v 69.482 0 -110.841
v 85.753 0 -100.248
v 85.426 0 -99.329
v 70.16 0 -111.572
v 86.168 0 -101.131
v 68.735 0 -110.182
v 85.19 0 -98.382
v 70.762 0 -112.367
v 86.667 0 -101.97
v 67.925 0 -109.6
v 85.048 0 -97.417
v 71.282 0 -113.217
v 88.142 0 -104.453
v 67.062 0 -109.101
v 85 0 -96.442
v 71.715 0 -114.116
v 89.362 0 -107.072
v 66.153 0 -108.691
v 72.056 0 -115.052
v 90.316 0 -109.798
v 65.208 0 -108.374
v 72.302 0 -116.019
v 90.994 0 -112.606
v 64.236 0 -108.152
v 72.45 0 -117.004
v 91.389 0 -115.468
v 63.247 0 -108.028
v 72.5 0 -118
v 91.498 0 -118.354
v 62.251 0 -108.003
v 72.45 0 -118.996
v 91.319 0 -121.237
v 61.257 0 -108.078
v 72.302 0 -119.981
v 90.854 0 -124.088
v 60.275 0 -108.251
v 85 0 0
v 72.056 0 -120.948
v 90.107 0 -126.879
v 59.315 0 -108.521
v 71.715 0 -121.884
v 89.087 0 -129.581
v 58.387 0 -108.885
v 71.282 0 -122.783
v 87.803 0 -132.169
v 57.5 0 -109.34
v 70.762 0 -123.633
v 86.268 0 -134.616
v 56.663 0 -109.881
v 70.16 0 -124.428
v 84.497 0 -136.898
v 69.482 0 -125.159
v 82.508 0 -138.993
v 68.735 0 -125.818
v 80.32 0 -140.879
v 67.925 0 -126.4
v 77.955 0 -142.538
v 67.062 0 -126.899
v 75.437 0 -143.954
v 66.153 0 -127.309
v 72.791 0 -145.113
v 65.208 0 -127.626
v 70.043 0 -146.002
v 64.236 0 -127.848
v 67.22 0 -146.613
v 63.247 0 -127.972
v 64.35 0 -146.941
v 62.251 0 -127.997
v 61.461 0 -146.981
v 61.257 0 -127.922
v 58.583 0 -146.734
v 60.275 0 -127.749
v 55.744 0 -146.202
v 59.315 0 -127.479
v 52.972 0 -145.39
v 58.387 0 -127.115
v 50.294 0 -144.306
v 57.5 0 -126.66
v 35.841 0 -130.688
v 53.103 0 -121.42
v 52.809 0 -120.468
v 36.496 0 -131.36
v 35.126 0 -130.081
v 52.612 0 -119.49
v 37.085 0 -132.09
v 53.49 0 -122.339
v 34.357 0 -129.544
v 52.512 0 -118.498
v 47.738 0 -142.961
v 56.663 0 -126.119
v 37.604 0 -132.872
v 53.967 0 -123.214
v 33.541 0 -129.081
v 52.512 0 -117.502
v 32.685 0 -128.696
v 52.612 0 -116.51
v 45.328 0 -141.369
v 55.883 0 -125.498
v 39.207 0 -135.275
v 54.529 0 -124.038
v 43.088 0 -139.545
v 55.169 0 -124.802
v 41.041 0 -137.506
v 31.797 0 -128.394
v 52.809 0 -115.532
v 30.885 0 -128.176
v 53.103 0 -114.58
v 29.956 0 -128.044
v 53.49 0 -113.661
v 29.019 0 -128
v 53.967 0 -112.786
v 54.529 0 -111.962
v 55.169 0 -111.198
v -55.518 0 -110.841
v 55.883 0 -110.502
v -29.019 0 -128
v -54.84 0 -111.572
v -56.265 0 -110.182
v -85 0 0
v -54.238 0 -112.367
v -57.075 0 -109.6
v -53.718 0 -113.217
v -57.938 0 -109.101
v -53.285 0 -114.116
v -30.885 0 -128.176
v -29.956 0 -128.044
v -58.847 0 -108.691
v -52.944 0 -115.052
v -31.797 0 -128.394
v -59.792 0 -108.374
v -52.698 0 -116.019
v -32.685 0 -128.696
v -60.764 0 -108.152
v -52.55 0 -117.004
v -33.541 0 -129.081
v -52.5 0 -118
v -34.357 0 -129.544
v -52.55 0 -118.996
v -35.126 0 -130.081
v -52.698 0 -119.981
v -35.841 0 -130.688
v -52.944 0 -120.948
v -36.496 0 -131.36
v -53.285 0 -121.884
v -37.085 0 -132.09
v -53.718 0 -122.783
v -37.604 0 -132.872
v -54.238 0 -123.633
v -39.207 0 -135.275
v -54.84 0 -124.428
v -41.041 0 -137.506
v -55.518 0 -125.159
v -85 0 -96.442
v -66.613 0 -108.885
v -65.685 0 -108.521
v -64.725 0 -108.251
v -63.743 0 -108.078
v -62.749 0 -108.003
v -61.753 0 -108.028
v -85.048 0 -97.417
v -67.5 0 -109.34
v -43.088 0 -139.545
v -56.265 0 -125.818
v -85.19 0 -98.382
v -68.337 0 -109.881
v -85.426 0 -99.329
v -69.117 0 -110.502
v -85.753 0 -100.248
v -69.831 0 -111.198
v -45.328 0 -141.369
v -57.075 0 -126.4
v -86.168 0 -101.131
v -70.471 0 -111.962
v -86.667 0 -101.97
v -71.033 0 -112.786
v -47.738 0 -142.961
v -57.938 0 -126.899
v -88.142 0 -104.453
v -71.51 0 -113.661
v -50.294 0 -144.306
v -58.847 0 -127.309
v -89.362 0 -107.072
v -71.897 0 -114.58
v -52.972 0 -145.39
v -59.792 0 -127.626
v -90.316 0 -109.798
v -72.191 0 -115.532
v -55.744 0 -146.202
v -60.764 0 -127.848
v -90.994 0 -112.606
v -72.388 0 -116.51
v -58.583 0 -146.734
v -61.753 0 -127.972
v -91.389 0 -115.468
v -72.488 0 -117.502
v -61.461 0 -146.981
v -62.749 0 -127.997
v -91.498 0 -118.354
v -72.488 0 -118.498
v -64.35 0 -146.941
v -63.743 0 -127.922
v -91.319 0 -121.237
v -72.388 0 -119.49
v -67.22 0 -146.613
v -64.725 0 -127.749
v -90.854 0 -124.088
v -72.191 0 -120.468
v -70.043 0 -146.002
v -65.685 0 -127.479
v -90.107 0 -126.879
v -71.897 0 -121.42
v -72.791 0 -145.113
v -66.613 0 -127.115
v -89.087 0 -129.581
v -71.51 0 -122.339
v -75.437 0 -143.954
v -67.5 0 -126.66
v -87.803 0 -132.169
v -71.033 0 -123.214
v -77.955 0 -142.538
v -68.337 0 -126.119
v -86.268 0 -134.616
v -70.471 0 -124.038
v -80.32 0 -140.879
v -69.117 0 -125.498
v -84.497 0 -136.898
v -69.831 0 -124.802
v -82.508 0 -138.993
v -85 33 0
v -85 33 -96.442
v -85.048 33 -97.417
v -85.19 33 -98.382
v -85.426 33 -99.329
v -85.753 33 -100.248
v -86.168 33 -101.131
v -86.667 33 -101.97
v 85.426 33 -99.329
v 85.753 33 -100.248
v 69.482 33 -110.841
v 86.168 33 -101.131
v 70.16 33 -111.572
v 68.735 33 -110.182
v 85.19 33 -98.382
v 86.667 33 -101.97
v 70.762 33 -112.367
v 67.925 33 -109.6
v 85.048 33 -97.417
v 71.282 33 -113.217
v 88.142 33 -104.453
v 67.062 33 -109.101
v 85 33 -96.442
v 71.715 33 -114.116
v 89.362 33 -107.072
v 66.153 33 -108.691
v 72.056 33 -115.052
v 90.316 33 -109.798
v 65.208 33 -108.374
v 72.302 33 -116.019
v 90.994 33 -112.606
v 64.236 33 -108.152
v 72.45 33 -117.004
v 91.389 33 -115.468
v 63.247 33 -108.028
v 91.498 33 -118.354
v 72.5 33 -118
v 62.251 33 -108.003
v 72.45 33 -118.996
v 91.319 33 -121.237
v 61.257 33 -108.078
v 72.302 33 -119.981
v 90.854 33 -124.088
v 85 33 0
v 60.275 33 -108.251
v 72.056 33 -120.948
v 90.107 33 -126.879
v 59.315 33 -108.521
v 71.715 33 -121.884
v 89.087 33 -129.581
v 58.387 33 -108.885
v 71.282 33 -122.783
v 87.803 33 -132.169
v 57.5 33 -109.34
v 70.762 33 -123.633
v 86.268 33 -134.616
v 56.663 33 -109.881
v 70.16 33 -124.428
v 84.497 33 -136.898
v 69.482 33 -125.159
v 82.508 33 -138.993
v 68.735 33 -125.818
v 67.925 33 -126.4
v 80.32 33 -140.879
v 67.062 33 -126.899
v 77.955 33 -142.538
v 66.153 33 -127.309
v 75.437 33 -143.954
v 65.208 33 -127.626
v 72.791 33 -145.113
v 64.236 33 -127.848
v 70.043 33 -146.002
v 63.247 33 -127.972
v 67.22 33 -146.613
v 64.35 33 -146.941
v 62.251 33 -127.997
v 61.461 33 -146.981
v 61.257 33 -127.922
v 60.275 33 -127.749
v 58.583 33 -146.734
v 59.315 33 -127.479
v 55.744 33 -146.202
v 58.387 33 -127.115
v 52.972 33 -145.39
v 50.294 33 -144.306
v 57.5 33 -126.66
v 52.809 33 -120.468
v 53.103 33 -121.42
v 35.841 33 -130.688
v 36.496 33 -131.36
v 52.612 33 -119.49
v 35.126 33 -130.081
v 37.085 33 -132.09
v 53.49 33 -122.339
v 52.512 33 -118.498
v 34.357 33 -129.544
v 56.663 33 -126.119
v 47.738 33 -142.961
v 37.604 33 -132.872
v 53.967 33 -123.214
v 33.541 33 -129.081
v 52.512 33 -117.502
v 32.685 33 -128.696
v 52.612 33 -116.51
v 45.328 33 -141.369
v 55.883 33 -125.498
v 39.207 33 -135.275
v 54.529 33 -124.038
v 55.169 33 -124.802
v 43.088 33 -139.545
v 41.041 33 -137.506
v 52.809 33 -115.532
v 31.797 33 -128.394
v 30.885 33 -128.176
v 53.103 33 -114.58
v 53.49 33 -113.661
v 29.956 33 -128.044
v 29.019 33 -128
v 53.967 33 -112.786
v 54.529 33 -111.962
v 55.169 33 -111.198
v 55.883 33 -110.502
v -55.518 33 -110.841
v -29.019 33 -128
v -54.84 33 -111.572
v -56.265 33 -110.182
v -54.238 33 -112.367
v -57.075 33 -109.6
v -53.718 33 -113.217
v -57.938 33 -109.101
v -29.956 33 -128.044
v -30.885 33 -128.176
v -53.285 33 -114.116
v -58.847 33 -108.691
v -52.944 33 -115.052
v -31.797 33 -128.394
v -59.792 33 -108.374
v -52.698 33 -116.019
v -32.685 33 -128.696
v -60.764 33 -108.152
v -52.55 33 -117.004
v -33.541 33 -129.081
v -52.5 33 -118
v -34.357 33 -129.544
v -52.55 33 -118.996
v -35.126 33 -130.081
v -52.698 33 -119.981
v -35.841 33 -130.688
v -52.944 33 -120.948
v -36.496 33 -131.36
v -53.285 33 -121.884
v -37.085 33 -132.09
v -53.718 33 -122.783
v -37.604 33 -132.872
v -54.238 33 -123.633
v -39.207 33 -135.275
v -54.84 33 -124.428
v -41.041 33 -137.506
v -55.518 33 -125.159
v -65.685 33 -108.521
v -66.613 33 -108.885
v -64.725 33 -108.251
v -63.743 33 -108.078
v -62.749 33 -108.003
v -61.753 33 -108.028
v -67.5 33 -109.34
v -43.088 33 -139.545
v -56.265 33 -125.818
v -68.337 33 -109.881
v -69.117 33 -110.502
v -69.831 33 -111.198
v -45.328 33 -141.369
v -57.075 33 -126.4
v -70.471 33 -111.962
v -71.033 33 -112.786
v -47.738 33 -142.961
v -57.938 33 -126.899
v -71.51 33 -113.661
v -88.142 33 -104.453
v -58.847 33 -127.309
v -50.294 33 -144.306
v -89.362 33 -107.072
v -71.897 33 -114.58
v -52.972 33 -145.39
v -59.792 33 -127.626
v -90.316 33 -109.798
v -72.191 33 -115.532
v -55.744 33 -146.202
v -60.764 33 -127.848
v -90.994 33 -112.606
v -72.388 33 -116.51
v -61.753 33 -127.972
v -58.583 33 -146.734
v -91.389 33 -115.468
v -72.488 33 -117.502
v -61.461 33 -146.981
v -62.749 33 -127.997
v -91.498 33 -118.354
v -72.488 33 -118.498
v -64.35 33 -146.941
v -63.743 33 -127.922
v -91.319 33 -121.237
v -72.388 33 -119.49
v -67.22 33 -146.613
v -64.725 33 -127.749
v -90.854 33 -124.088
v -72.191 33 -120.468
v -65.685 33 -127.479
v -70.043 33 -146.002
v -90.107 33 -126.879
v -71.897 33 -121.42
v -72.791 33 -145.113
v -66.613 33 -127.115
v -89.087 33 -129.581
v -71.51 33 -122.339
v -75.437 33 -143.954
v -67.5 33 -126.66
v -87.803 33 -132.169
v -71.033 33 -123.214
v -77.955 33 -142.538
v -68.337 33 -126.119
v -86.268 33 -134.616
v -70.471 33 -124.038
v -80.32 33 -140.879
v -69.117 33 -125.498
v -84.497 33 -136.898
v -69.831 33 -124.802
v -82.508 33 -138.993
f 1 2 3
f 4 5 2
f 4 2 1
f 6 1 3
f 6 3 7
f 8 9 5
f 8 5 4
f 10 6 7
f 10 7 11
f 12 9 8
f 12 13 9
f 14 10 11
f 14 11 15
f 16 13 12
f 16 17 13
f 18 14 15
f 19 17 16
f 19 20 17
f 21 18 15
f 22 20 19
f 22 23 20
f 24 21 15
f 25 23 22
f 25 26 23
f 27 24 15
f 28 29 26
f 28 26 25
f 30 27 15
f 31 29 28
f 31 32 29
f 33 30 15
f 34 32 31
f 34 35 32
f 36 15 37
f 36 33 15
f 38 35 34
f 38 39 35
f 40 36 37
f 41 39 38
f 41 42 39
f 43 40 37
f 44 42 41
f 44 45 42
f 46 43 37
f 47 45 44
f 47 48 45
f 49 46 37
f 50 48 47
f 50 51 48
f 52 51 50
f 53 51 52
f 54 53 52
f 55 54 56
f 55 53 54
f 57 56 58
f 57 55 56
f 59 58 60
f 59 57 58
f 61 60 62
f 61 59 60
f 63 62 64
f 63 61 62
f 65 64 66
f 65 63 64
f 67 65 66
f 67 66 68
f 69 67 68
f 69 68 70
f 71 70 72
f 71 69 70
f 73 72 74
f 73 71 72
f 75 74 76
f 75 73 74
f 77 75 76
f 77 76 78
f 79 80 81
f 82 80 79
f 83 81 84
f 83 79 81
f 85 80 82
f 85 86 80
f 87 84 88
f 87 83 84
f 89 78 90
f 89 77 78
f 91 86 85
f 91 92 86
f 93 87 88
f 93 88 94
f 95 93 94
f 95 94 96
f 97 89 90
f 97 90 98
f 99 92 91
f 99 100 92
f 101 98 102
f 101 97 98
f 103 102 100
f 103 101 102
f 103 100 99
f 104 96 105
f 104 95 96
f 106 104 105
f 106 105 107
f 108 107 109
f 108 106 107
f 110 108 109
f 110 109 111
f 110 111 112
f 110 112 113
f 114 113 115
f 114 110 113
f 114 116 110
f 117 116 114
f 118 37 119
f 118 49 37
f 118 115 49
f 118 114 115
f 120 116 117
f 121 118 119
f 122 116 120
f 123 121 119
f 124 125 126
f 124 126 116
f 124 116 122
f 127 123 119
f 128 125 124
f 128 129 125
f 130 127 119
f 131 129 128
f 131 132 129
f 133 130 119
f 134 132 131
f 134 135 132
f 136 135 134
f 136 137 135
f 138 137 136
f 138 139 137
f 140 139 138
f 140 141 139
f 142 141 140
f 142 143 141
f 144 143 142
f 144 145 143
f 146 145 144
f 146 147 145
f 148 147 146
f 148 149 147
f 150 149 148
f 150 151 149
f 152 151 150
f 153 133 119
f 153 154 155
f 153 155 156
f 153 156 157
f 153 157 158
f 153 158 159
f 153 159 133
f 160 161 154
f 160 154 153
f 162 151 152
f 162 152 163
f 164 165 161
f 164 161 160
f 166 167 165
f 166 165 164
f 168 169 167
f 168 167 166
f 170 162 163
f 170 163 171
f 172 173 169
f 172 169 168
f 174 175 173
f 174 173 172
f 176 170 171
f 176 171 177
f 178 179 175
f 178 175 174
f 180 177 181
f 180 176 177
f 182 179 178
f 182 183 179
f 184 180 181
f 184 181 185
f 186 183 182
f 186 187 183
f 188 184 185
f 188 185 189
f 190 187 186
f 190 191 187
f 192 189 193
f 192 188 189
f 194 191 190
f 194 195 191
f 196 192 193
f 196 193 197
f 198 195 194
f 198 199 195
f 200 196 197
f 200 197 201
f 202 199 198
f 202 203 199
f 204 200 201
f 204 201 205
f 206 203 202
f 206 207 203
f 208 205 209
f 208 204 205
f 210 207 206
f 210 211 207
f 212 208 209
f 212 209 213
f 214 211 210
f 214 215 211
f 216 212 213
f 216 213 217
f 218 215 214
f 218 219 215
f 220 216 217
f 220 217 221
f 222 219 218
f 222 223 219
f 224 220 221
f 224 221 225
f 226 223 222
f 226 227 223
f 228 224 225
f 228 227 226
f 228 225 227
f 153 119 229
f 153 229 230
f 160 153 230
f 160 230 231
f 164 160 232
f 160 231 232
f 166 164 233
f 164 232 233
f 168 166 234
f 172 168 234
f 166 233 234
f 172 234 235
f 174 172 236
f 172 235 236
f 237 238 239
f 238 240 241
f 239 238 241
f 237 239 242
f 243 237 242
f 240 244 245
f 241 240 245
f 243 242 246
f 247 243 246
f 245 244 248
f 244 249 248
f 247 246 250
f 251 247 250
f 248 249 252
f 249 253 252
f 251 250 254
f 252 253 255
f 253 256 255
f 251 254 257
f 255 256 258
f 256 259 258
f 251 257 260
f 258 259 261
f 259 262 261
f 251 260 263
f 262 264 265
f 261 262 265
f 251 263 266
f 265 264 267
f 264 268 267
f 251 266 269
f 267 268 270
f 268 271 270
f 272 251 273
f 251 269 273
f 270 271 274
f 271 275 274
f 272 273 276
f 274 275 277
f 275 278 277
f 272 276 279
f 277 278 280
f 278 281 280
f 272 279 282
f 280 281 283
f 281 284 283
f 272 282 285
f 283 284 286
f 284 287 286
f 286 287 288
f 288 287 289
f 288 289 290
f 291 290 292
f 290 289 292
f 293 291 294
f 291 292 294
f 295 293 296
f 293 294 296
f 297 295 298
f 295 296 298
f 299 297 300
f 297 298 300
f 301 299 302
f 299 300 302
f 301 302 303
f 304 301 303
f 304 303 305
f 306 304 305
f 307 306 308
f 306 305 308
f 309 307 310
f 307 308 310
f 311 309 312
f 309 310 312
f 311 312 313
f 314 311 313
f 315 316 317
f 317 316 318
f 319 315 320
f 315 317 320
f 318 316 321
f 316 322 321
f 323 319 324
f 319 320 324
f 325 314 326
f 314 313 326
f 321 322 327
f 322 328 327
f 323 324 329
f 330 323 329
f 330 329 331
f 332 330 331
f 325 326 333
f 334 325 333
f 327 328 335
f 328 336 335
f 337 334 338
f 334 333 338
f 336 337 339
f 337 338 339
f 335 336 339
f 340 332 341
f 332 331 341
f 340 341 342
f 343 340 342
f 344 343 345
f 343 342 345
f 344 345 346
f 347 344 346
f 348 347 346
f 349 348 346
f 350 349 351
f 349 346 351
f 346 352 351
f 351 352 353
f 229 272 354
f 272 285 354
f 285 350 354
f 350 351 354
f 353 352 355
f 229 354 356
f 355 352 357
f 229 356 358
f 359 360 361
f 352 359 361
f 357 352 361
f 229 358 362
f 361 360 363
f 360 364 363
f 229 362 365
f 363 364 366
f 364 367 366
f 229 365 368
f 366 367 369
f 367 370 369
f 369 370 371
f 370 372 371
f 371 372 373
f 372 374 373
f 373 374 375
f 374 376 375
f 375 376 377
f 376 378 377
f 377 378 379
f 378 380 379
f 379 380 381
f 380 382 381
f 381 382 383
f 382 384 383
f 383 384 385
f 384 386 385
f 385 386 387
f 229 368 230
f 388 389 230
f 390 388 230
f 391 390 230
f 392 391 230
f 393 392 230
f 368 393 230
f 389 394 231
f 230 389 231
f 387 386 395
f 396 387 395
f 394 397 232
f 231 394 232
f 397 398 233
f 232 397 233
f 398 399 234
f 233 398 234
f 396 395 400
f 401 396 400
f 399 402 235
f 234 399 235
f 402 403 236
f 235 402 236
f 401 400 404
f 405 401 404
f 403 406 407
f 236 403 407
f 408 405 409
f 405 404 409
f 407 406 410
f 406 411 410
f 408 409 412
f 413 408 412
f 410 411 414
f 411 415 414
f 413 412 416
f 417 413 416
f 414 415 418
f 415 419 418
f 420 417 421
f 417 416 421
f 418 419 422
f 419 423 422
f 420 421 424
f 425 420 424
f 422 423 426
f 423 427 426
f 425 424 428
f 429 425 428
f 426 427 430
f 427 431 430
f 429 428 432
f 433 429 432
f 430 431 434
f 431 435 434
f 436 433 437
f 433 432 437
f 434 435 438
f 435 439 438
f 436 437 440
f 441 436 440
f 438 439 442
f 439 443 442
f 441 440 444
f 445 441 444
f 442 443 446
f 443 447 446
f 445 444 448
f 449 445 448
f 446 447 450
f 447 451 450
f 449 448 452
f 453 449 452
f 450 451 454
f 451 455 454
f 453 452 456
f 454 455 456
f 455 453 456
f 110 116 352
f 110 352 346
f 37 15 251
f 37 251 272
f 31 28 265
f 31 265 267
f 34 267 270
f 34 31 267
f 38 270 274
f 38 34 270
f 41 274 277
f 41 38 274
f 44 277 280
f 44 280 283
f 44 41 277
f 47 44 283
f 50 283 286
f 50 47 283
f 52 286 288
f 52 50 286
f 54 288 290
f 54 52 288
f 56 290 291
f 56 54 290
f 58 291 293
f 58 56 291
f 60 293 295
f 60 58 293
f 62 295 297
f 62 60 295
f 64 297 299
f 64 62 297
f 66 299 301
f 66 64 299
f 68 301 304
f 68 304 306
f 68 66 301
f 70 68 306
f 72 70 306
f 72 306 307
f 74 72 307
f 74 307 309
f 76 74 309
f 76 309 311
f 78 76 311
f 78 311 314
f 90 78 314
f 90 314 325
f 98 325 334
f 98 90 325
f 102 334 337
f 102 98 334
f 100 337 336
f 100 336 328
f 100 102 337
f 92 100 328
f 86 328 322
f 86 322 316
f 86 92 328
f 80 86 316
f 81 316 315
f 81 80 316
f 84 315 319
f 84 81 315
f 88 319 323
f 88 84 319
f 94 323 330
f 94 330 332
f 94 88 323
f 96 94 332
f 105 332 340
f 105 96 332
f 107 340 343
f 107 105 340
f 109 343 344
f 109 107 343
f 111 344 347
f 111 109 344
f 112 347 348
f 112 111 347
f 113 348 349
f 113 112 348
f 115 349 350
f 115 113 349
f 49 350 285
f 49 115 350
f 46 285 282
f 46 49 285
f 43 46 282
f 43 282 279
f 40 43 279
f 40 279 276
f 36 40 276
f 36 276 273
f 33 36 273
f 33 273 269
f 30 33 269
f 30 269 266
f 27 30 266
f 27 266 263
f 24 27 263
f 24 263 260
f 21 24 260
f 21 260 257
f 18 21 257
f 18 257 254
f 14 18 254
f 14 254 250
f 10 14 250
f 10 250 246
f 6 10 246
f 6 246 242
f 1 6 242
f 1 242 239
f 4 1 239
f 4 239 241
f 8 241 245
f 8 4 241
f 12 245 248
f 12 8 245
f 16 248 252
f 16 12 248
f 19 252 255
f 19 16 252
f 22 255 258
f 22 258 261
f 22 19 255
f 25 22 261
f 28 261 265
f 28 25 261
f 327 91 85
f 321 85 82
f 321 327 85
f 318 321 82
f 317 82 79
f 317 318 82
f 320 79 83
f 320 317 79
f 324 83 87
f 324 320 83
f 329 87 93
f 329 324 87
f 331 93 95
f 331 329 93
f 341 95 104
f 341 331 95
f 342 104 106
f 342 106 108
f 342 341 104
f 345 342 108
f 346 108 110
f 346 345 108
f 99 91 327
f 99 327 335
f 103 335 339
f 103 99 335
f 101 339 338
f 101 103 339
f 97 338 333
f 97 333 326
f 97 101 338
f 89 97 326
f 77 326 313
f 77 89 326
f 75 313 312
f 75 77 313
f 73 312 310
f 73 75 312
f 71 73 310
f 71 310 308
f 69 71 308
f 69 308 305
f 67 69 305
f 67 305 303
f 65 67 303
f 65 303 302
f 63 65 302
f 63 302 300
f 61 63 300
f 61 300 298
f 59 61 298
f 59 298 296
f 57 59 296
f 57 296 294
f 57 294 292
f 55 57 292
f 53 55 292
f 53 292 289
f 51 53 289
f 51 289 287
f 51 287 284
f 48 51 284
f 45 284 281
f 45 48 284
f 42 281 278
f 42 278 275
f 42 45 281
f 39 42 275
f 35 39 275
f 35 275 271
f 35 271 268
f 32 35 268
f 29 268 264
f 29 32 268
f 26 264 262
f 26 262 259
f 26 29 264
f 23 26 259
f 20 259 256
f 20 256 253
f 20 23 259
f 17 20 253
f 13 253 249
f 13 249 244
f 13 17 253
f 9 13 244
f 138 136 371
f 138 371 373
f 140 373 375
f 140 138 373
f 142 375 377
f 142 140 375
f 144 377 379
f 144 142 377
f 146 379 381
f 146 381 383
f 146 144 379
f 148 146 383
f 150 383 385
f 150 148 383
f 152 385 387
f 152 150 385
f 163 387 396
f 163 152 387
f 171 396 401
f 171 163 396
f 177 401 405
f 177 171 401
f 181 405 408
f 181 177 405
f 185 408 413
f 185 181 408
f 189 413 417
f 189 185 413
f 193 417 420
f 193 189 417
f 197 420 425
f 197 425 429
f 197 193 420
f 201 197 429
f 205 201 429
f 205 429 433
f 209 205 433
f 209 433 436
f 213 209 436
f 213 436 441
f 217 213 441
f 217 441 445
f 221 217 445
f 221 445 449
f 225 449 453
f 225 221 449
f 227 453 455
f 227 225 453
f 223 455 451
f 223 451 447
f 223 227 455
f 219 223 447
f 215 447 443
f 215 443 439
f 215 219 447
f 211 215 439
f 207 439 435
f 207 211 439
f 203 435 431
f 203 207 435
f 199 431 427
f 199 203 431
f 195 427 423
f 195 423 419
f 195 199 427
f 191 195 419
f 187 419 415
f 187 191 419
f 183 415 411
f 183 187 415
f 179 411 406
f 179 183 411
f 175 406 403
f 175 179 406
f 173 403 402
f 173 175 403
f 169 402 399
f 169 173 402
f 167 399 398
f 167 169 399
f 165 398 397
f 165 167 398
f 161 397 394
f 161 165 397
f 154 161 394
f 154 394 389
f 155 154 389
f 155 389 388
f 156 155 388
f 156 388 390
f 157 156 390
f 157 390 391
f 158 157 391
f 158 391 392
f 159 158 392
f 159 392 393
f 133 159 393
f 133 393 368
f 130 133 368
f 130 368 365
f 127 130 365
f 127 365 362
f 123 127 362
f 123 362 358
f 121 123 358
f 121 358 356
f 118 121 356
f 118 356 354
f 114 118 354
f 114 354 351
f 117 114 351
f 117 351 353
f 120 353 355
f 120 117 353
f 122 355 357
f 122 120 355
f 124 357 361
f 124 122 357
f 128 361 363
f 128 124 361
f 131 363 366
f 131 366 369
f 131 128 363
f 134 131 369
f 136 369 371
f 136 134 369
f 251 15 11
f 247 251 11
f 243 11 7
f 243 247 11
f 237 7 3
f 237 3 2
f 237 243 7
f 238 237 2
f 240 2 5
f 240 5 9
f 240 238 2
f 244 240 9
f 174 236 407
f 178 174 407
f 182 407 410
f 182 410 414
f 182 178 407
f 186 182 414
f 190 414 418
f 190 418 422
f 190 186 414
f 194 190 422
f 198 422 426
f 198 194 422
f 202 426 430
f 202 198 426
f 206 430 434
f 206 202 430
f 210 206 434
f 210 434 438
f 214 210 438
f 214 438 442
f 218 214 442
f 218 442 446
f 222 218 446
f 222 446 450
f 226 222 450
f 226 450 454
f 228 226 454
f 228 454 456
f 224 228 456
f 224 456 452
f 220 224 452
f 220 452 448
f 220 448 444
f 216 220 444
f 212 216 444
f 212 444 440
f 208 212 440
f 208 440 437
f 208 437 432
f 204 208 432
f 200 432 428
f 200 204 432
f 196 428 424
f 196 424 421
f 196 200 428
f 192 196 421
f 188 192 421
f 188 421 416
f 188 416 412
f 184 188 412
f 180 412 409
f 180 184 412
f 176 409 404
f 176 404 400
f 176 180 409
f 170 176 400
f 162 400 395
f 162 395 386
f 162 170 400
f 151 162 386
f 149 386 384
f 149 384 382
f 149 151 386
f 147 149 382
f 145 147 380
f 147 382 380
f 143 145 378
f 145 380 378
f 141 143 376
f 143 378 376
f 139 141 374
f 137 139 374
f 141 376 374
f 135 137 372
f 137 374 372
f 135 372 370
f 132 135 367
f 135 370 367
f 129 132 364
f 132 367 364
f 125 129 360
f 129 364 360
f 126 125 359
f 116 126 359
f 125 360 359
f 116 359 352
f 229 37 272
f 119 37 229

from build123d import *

# Parameters (mm, degrees)
SKETCH1_R           = 10
BOSS_EXTRUDE1_DEPTH = 33
FILLET1_R           = 10


with BuildPart() as part:
    # Sketch1 → Boss-Extrude1 (new body)
    with BuildSketch(Plane(origin=(0, 0, 0), x_dir=(1, 0, 0), z_dir=(0, 1, 0))):
        with BuildLine():
            Line((85, 0), (-85, 0))
            Line((-85, 0), (-85, 99.703825536))
            ThreePointArc((-85, 99.703825536), (-76.843677233, 143.204343345), (-35.278684822, 128))
            Line((-35.278684822, 128), (35.278684822, 128))
            ThreePointArc((35.278684822, 128), (76.843677233, 143.204343345), (85, 99.703825536))
            Line((85, 99.703825536), (85, 0))
        make_face()
        with Locations((-62.5, 118)):
            Circle(SKETCH1_R, mode=Mode.SUBTRACT)
        with Locations((62.5, 118)):
            Circle(SKETCH1_R, mode=Mode.SUBTRACT)
    extrude(amount=BOSS_EXTRUDE1_DEPTH)

    # Fillet1
    fillet1_edges = [part.edges().sort_by_distance(p)[0] for p in [
        (-85, 16.5, -99.703825536),
        (-35.278684822, 16.5, -128),
        (35.278684822, 16.5, -128),
        (85, 16.5, -99.703825536),
    ]]
    fillet(fillet1_edges, radius=FILLET1_R)


solid = part.part
